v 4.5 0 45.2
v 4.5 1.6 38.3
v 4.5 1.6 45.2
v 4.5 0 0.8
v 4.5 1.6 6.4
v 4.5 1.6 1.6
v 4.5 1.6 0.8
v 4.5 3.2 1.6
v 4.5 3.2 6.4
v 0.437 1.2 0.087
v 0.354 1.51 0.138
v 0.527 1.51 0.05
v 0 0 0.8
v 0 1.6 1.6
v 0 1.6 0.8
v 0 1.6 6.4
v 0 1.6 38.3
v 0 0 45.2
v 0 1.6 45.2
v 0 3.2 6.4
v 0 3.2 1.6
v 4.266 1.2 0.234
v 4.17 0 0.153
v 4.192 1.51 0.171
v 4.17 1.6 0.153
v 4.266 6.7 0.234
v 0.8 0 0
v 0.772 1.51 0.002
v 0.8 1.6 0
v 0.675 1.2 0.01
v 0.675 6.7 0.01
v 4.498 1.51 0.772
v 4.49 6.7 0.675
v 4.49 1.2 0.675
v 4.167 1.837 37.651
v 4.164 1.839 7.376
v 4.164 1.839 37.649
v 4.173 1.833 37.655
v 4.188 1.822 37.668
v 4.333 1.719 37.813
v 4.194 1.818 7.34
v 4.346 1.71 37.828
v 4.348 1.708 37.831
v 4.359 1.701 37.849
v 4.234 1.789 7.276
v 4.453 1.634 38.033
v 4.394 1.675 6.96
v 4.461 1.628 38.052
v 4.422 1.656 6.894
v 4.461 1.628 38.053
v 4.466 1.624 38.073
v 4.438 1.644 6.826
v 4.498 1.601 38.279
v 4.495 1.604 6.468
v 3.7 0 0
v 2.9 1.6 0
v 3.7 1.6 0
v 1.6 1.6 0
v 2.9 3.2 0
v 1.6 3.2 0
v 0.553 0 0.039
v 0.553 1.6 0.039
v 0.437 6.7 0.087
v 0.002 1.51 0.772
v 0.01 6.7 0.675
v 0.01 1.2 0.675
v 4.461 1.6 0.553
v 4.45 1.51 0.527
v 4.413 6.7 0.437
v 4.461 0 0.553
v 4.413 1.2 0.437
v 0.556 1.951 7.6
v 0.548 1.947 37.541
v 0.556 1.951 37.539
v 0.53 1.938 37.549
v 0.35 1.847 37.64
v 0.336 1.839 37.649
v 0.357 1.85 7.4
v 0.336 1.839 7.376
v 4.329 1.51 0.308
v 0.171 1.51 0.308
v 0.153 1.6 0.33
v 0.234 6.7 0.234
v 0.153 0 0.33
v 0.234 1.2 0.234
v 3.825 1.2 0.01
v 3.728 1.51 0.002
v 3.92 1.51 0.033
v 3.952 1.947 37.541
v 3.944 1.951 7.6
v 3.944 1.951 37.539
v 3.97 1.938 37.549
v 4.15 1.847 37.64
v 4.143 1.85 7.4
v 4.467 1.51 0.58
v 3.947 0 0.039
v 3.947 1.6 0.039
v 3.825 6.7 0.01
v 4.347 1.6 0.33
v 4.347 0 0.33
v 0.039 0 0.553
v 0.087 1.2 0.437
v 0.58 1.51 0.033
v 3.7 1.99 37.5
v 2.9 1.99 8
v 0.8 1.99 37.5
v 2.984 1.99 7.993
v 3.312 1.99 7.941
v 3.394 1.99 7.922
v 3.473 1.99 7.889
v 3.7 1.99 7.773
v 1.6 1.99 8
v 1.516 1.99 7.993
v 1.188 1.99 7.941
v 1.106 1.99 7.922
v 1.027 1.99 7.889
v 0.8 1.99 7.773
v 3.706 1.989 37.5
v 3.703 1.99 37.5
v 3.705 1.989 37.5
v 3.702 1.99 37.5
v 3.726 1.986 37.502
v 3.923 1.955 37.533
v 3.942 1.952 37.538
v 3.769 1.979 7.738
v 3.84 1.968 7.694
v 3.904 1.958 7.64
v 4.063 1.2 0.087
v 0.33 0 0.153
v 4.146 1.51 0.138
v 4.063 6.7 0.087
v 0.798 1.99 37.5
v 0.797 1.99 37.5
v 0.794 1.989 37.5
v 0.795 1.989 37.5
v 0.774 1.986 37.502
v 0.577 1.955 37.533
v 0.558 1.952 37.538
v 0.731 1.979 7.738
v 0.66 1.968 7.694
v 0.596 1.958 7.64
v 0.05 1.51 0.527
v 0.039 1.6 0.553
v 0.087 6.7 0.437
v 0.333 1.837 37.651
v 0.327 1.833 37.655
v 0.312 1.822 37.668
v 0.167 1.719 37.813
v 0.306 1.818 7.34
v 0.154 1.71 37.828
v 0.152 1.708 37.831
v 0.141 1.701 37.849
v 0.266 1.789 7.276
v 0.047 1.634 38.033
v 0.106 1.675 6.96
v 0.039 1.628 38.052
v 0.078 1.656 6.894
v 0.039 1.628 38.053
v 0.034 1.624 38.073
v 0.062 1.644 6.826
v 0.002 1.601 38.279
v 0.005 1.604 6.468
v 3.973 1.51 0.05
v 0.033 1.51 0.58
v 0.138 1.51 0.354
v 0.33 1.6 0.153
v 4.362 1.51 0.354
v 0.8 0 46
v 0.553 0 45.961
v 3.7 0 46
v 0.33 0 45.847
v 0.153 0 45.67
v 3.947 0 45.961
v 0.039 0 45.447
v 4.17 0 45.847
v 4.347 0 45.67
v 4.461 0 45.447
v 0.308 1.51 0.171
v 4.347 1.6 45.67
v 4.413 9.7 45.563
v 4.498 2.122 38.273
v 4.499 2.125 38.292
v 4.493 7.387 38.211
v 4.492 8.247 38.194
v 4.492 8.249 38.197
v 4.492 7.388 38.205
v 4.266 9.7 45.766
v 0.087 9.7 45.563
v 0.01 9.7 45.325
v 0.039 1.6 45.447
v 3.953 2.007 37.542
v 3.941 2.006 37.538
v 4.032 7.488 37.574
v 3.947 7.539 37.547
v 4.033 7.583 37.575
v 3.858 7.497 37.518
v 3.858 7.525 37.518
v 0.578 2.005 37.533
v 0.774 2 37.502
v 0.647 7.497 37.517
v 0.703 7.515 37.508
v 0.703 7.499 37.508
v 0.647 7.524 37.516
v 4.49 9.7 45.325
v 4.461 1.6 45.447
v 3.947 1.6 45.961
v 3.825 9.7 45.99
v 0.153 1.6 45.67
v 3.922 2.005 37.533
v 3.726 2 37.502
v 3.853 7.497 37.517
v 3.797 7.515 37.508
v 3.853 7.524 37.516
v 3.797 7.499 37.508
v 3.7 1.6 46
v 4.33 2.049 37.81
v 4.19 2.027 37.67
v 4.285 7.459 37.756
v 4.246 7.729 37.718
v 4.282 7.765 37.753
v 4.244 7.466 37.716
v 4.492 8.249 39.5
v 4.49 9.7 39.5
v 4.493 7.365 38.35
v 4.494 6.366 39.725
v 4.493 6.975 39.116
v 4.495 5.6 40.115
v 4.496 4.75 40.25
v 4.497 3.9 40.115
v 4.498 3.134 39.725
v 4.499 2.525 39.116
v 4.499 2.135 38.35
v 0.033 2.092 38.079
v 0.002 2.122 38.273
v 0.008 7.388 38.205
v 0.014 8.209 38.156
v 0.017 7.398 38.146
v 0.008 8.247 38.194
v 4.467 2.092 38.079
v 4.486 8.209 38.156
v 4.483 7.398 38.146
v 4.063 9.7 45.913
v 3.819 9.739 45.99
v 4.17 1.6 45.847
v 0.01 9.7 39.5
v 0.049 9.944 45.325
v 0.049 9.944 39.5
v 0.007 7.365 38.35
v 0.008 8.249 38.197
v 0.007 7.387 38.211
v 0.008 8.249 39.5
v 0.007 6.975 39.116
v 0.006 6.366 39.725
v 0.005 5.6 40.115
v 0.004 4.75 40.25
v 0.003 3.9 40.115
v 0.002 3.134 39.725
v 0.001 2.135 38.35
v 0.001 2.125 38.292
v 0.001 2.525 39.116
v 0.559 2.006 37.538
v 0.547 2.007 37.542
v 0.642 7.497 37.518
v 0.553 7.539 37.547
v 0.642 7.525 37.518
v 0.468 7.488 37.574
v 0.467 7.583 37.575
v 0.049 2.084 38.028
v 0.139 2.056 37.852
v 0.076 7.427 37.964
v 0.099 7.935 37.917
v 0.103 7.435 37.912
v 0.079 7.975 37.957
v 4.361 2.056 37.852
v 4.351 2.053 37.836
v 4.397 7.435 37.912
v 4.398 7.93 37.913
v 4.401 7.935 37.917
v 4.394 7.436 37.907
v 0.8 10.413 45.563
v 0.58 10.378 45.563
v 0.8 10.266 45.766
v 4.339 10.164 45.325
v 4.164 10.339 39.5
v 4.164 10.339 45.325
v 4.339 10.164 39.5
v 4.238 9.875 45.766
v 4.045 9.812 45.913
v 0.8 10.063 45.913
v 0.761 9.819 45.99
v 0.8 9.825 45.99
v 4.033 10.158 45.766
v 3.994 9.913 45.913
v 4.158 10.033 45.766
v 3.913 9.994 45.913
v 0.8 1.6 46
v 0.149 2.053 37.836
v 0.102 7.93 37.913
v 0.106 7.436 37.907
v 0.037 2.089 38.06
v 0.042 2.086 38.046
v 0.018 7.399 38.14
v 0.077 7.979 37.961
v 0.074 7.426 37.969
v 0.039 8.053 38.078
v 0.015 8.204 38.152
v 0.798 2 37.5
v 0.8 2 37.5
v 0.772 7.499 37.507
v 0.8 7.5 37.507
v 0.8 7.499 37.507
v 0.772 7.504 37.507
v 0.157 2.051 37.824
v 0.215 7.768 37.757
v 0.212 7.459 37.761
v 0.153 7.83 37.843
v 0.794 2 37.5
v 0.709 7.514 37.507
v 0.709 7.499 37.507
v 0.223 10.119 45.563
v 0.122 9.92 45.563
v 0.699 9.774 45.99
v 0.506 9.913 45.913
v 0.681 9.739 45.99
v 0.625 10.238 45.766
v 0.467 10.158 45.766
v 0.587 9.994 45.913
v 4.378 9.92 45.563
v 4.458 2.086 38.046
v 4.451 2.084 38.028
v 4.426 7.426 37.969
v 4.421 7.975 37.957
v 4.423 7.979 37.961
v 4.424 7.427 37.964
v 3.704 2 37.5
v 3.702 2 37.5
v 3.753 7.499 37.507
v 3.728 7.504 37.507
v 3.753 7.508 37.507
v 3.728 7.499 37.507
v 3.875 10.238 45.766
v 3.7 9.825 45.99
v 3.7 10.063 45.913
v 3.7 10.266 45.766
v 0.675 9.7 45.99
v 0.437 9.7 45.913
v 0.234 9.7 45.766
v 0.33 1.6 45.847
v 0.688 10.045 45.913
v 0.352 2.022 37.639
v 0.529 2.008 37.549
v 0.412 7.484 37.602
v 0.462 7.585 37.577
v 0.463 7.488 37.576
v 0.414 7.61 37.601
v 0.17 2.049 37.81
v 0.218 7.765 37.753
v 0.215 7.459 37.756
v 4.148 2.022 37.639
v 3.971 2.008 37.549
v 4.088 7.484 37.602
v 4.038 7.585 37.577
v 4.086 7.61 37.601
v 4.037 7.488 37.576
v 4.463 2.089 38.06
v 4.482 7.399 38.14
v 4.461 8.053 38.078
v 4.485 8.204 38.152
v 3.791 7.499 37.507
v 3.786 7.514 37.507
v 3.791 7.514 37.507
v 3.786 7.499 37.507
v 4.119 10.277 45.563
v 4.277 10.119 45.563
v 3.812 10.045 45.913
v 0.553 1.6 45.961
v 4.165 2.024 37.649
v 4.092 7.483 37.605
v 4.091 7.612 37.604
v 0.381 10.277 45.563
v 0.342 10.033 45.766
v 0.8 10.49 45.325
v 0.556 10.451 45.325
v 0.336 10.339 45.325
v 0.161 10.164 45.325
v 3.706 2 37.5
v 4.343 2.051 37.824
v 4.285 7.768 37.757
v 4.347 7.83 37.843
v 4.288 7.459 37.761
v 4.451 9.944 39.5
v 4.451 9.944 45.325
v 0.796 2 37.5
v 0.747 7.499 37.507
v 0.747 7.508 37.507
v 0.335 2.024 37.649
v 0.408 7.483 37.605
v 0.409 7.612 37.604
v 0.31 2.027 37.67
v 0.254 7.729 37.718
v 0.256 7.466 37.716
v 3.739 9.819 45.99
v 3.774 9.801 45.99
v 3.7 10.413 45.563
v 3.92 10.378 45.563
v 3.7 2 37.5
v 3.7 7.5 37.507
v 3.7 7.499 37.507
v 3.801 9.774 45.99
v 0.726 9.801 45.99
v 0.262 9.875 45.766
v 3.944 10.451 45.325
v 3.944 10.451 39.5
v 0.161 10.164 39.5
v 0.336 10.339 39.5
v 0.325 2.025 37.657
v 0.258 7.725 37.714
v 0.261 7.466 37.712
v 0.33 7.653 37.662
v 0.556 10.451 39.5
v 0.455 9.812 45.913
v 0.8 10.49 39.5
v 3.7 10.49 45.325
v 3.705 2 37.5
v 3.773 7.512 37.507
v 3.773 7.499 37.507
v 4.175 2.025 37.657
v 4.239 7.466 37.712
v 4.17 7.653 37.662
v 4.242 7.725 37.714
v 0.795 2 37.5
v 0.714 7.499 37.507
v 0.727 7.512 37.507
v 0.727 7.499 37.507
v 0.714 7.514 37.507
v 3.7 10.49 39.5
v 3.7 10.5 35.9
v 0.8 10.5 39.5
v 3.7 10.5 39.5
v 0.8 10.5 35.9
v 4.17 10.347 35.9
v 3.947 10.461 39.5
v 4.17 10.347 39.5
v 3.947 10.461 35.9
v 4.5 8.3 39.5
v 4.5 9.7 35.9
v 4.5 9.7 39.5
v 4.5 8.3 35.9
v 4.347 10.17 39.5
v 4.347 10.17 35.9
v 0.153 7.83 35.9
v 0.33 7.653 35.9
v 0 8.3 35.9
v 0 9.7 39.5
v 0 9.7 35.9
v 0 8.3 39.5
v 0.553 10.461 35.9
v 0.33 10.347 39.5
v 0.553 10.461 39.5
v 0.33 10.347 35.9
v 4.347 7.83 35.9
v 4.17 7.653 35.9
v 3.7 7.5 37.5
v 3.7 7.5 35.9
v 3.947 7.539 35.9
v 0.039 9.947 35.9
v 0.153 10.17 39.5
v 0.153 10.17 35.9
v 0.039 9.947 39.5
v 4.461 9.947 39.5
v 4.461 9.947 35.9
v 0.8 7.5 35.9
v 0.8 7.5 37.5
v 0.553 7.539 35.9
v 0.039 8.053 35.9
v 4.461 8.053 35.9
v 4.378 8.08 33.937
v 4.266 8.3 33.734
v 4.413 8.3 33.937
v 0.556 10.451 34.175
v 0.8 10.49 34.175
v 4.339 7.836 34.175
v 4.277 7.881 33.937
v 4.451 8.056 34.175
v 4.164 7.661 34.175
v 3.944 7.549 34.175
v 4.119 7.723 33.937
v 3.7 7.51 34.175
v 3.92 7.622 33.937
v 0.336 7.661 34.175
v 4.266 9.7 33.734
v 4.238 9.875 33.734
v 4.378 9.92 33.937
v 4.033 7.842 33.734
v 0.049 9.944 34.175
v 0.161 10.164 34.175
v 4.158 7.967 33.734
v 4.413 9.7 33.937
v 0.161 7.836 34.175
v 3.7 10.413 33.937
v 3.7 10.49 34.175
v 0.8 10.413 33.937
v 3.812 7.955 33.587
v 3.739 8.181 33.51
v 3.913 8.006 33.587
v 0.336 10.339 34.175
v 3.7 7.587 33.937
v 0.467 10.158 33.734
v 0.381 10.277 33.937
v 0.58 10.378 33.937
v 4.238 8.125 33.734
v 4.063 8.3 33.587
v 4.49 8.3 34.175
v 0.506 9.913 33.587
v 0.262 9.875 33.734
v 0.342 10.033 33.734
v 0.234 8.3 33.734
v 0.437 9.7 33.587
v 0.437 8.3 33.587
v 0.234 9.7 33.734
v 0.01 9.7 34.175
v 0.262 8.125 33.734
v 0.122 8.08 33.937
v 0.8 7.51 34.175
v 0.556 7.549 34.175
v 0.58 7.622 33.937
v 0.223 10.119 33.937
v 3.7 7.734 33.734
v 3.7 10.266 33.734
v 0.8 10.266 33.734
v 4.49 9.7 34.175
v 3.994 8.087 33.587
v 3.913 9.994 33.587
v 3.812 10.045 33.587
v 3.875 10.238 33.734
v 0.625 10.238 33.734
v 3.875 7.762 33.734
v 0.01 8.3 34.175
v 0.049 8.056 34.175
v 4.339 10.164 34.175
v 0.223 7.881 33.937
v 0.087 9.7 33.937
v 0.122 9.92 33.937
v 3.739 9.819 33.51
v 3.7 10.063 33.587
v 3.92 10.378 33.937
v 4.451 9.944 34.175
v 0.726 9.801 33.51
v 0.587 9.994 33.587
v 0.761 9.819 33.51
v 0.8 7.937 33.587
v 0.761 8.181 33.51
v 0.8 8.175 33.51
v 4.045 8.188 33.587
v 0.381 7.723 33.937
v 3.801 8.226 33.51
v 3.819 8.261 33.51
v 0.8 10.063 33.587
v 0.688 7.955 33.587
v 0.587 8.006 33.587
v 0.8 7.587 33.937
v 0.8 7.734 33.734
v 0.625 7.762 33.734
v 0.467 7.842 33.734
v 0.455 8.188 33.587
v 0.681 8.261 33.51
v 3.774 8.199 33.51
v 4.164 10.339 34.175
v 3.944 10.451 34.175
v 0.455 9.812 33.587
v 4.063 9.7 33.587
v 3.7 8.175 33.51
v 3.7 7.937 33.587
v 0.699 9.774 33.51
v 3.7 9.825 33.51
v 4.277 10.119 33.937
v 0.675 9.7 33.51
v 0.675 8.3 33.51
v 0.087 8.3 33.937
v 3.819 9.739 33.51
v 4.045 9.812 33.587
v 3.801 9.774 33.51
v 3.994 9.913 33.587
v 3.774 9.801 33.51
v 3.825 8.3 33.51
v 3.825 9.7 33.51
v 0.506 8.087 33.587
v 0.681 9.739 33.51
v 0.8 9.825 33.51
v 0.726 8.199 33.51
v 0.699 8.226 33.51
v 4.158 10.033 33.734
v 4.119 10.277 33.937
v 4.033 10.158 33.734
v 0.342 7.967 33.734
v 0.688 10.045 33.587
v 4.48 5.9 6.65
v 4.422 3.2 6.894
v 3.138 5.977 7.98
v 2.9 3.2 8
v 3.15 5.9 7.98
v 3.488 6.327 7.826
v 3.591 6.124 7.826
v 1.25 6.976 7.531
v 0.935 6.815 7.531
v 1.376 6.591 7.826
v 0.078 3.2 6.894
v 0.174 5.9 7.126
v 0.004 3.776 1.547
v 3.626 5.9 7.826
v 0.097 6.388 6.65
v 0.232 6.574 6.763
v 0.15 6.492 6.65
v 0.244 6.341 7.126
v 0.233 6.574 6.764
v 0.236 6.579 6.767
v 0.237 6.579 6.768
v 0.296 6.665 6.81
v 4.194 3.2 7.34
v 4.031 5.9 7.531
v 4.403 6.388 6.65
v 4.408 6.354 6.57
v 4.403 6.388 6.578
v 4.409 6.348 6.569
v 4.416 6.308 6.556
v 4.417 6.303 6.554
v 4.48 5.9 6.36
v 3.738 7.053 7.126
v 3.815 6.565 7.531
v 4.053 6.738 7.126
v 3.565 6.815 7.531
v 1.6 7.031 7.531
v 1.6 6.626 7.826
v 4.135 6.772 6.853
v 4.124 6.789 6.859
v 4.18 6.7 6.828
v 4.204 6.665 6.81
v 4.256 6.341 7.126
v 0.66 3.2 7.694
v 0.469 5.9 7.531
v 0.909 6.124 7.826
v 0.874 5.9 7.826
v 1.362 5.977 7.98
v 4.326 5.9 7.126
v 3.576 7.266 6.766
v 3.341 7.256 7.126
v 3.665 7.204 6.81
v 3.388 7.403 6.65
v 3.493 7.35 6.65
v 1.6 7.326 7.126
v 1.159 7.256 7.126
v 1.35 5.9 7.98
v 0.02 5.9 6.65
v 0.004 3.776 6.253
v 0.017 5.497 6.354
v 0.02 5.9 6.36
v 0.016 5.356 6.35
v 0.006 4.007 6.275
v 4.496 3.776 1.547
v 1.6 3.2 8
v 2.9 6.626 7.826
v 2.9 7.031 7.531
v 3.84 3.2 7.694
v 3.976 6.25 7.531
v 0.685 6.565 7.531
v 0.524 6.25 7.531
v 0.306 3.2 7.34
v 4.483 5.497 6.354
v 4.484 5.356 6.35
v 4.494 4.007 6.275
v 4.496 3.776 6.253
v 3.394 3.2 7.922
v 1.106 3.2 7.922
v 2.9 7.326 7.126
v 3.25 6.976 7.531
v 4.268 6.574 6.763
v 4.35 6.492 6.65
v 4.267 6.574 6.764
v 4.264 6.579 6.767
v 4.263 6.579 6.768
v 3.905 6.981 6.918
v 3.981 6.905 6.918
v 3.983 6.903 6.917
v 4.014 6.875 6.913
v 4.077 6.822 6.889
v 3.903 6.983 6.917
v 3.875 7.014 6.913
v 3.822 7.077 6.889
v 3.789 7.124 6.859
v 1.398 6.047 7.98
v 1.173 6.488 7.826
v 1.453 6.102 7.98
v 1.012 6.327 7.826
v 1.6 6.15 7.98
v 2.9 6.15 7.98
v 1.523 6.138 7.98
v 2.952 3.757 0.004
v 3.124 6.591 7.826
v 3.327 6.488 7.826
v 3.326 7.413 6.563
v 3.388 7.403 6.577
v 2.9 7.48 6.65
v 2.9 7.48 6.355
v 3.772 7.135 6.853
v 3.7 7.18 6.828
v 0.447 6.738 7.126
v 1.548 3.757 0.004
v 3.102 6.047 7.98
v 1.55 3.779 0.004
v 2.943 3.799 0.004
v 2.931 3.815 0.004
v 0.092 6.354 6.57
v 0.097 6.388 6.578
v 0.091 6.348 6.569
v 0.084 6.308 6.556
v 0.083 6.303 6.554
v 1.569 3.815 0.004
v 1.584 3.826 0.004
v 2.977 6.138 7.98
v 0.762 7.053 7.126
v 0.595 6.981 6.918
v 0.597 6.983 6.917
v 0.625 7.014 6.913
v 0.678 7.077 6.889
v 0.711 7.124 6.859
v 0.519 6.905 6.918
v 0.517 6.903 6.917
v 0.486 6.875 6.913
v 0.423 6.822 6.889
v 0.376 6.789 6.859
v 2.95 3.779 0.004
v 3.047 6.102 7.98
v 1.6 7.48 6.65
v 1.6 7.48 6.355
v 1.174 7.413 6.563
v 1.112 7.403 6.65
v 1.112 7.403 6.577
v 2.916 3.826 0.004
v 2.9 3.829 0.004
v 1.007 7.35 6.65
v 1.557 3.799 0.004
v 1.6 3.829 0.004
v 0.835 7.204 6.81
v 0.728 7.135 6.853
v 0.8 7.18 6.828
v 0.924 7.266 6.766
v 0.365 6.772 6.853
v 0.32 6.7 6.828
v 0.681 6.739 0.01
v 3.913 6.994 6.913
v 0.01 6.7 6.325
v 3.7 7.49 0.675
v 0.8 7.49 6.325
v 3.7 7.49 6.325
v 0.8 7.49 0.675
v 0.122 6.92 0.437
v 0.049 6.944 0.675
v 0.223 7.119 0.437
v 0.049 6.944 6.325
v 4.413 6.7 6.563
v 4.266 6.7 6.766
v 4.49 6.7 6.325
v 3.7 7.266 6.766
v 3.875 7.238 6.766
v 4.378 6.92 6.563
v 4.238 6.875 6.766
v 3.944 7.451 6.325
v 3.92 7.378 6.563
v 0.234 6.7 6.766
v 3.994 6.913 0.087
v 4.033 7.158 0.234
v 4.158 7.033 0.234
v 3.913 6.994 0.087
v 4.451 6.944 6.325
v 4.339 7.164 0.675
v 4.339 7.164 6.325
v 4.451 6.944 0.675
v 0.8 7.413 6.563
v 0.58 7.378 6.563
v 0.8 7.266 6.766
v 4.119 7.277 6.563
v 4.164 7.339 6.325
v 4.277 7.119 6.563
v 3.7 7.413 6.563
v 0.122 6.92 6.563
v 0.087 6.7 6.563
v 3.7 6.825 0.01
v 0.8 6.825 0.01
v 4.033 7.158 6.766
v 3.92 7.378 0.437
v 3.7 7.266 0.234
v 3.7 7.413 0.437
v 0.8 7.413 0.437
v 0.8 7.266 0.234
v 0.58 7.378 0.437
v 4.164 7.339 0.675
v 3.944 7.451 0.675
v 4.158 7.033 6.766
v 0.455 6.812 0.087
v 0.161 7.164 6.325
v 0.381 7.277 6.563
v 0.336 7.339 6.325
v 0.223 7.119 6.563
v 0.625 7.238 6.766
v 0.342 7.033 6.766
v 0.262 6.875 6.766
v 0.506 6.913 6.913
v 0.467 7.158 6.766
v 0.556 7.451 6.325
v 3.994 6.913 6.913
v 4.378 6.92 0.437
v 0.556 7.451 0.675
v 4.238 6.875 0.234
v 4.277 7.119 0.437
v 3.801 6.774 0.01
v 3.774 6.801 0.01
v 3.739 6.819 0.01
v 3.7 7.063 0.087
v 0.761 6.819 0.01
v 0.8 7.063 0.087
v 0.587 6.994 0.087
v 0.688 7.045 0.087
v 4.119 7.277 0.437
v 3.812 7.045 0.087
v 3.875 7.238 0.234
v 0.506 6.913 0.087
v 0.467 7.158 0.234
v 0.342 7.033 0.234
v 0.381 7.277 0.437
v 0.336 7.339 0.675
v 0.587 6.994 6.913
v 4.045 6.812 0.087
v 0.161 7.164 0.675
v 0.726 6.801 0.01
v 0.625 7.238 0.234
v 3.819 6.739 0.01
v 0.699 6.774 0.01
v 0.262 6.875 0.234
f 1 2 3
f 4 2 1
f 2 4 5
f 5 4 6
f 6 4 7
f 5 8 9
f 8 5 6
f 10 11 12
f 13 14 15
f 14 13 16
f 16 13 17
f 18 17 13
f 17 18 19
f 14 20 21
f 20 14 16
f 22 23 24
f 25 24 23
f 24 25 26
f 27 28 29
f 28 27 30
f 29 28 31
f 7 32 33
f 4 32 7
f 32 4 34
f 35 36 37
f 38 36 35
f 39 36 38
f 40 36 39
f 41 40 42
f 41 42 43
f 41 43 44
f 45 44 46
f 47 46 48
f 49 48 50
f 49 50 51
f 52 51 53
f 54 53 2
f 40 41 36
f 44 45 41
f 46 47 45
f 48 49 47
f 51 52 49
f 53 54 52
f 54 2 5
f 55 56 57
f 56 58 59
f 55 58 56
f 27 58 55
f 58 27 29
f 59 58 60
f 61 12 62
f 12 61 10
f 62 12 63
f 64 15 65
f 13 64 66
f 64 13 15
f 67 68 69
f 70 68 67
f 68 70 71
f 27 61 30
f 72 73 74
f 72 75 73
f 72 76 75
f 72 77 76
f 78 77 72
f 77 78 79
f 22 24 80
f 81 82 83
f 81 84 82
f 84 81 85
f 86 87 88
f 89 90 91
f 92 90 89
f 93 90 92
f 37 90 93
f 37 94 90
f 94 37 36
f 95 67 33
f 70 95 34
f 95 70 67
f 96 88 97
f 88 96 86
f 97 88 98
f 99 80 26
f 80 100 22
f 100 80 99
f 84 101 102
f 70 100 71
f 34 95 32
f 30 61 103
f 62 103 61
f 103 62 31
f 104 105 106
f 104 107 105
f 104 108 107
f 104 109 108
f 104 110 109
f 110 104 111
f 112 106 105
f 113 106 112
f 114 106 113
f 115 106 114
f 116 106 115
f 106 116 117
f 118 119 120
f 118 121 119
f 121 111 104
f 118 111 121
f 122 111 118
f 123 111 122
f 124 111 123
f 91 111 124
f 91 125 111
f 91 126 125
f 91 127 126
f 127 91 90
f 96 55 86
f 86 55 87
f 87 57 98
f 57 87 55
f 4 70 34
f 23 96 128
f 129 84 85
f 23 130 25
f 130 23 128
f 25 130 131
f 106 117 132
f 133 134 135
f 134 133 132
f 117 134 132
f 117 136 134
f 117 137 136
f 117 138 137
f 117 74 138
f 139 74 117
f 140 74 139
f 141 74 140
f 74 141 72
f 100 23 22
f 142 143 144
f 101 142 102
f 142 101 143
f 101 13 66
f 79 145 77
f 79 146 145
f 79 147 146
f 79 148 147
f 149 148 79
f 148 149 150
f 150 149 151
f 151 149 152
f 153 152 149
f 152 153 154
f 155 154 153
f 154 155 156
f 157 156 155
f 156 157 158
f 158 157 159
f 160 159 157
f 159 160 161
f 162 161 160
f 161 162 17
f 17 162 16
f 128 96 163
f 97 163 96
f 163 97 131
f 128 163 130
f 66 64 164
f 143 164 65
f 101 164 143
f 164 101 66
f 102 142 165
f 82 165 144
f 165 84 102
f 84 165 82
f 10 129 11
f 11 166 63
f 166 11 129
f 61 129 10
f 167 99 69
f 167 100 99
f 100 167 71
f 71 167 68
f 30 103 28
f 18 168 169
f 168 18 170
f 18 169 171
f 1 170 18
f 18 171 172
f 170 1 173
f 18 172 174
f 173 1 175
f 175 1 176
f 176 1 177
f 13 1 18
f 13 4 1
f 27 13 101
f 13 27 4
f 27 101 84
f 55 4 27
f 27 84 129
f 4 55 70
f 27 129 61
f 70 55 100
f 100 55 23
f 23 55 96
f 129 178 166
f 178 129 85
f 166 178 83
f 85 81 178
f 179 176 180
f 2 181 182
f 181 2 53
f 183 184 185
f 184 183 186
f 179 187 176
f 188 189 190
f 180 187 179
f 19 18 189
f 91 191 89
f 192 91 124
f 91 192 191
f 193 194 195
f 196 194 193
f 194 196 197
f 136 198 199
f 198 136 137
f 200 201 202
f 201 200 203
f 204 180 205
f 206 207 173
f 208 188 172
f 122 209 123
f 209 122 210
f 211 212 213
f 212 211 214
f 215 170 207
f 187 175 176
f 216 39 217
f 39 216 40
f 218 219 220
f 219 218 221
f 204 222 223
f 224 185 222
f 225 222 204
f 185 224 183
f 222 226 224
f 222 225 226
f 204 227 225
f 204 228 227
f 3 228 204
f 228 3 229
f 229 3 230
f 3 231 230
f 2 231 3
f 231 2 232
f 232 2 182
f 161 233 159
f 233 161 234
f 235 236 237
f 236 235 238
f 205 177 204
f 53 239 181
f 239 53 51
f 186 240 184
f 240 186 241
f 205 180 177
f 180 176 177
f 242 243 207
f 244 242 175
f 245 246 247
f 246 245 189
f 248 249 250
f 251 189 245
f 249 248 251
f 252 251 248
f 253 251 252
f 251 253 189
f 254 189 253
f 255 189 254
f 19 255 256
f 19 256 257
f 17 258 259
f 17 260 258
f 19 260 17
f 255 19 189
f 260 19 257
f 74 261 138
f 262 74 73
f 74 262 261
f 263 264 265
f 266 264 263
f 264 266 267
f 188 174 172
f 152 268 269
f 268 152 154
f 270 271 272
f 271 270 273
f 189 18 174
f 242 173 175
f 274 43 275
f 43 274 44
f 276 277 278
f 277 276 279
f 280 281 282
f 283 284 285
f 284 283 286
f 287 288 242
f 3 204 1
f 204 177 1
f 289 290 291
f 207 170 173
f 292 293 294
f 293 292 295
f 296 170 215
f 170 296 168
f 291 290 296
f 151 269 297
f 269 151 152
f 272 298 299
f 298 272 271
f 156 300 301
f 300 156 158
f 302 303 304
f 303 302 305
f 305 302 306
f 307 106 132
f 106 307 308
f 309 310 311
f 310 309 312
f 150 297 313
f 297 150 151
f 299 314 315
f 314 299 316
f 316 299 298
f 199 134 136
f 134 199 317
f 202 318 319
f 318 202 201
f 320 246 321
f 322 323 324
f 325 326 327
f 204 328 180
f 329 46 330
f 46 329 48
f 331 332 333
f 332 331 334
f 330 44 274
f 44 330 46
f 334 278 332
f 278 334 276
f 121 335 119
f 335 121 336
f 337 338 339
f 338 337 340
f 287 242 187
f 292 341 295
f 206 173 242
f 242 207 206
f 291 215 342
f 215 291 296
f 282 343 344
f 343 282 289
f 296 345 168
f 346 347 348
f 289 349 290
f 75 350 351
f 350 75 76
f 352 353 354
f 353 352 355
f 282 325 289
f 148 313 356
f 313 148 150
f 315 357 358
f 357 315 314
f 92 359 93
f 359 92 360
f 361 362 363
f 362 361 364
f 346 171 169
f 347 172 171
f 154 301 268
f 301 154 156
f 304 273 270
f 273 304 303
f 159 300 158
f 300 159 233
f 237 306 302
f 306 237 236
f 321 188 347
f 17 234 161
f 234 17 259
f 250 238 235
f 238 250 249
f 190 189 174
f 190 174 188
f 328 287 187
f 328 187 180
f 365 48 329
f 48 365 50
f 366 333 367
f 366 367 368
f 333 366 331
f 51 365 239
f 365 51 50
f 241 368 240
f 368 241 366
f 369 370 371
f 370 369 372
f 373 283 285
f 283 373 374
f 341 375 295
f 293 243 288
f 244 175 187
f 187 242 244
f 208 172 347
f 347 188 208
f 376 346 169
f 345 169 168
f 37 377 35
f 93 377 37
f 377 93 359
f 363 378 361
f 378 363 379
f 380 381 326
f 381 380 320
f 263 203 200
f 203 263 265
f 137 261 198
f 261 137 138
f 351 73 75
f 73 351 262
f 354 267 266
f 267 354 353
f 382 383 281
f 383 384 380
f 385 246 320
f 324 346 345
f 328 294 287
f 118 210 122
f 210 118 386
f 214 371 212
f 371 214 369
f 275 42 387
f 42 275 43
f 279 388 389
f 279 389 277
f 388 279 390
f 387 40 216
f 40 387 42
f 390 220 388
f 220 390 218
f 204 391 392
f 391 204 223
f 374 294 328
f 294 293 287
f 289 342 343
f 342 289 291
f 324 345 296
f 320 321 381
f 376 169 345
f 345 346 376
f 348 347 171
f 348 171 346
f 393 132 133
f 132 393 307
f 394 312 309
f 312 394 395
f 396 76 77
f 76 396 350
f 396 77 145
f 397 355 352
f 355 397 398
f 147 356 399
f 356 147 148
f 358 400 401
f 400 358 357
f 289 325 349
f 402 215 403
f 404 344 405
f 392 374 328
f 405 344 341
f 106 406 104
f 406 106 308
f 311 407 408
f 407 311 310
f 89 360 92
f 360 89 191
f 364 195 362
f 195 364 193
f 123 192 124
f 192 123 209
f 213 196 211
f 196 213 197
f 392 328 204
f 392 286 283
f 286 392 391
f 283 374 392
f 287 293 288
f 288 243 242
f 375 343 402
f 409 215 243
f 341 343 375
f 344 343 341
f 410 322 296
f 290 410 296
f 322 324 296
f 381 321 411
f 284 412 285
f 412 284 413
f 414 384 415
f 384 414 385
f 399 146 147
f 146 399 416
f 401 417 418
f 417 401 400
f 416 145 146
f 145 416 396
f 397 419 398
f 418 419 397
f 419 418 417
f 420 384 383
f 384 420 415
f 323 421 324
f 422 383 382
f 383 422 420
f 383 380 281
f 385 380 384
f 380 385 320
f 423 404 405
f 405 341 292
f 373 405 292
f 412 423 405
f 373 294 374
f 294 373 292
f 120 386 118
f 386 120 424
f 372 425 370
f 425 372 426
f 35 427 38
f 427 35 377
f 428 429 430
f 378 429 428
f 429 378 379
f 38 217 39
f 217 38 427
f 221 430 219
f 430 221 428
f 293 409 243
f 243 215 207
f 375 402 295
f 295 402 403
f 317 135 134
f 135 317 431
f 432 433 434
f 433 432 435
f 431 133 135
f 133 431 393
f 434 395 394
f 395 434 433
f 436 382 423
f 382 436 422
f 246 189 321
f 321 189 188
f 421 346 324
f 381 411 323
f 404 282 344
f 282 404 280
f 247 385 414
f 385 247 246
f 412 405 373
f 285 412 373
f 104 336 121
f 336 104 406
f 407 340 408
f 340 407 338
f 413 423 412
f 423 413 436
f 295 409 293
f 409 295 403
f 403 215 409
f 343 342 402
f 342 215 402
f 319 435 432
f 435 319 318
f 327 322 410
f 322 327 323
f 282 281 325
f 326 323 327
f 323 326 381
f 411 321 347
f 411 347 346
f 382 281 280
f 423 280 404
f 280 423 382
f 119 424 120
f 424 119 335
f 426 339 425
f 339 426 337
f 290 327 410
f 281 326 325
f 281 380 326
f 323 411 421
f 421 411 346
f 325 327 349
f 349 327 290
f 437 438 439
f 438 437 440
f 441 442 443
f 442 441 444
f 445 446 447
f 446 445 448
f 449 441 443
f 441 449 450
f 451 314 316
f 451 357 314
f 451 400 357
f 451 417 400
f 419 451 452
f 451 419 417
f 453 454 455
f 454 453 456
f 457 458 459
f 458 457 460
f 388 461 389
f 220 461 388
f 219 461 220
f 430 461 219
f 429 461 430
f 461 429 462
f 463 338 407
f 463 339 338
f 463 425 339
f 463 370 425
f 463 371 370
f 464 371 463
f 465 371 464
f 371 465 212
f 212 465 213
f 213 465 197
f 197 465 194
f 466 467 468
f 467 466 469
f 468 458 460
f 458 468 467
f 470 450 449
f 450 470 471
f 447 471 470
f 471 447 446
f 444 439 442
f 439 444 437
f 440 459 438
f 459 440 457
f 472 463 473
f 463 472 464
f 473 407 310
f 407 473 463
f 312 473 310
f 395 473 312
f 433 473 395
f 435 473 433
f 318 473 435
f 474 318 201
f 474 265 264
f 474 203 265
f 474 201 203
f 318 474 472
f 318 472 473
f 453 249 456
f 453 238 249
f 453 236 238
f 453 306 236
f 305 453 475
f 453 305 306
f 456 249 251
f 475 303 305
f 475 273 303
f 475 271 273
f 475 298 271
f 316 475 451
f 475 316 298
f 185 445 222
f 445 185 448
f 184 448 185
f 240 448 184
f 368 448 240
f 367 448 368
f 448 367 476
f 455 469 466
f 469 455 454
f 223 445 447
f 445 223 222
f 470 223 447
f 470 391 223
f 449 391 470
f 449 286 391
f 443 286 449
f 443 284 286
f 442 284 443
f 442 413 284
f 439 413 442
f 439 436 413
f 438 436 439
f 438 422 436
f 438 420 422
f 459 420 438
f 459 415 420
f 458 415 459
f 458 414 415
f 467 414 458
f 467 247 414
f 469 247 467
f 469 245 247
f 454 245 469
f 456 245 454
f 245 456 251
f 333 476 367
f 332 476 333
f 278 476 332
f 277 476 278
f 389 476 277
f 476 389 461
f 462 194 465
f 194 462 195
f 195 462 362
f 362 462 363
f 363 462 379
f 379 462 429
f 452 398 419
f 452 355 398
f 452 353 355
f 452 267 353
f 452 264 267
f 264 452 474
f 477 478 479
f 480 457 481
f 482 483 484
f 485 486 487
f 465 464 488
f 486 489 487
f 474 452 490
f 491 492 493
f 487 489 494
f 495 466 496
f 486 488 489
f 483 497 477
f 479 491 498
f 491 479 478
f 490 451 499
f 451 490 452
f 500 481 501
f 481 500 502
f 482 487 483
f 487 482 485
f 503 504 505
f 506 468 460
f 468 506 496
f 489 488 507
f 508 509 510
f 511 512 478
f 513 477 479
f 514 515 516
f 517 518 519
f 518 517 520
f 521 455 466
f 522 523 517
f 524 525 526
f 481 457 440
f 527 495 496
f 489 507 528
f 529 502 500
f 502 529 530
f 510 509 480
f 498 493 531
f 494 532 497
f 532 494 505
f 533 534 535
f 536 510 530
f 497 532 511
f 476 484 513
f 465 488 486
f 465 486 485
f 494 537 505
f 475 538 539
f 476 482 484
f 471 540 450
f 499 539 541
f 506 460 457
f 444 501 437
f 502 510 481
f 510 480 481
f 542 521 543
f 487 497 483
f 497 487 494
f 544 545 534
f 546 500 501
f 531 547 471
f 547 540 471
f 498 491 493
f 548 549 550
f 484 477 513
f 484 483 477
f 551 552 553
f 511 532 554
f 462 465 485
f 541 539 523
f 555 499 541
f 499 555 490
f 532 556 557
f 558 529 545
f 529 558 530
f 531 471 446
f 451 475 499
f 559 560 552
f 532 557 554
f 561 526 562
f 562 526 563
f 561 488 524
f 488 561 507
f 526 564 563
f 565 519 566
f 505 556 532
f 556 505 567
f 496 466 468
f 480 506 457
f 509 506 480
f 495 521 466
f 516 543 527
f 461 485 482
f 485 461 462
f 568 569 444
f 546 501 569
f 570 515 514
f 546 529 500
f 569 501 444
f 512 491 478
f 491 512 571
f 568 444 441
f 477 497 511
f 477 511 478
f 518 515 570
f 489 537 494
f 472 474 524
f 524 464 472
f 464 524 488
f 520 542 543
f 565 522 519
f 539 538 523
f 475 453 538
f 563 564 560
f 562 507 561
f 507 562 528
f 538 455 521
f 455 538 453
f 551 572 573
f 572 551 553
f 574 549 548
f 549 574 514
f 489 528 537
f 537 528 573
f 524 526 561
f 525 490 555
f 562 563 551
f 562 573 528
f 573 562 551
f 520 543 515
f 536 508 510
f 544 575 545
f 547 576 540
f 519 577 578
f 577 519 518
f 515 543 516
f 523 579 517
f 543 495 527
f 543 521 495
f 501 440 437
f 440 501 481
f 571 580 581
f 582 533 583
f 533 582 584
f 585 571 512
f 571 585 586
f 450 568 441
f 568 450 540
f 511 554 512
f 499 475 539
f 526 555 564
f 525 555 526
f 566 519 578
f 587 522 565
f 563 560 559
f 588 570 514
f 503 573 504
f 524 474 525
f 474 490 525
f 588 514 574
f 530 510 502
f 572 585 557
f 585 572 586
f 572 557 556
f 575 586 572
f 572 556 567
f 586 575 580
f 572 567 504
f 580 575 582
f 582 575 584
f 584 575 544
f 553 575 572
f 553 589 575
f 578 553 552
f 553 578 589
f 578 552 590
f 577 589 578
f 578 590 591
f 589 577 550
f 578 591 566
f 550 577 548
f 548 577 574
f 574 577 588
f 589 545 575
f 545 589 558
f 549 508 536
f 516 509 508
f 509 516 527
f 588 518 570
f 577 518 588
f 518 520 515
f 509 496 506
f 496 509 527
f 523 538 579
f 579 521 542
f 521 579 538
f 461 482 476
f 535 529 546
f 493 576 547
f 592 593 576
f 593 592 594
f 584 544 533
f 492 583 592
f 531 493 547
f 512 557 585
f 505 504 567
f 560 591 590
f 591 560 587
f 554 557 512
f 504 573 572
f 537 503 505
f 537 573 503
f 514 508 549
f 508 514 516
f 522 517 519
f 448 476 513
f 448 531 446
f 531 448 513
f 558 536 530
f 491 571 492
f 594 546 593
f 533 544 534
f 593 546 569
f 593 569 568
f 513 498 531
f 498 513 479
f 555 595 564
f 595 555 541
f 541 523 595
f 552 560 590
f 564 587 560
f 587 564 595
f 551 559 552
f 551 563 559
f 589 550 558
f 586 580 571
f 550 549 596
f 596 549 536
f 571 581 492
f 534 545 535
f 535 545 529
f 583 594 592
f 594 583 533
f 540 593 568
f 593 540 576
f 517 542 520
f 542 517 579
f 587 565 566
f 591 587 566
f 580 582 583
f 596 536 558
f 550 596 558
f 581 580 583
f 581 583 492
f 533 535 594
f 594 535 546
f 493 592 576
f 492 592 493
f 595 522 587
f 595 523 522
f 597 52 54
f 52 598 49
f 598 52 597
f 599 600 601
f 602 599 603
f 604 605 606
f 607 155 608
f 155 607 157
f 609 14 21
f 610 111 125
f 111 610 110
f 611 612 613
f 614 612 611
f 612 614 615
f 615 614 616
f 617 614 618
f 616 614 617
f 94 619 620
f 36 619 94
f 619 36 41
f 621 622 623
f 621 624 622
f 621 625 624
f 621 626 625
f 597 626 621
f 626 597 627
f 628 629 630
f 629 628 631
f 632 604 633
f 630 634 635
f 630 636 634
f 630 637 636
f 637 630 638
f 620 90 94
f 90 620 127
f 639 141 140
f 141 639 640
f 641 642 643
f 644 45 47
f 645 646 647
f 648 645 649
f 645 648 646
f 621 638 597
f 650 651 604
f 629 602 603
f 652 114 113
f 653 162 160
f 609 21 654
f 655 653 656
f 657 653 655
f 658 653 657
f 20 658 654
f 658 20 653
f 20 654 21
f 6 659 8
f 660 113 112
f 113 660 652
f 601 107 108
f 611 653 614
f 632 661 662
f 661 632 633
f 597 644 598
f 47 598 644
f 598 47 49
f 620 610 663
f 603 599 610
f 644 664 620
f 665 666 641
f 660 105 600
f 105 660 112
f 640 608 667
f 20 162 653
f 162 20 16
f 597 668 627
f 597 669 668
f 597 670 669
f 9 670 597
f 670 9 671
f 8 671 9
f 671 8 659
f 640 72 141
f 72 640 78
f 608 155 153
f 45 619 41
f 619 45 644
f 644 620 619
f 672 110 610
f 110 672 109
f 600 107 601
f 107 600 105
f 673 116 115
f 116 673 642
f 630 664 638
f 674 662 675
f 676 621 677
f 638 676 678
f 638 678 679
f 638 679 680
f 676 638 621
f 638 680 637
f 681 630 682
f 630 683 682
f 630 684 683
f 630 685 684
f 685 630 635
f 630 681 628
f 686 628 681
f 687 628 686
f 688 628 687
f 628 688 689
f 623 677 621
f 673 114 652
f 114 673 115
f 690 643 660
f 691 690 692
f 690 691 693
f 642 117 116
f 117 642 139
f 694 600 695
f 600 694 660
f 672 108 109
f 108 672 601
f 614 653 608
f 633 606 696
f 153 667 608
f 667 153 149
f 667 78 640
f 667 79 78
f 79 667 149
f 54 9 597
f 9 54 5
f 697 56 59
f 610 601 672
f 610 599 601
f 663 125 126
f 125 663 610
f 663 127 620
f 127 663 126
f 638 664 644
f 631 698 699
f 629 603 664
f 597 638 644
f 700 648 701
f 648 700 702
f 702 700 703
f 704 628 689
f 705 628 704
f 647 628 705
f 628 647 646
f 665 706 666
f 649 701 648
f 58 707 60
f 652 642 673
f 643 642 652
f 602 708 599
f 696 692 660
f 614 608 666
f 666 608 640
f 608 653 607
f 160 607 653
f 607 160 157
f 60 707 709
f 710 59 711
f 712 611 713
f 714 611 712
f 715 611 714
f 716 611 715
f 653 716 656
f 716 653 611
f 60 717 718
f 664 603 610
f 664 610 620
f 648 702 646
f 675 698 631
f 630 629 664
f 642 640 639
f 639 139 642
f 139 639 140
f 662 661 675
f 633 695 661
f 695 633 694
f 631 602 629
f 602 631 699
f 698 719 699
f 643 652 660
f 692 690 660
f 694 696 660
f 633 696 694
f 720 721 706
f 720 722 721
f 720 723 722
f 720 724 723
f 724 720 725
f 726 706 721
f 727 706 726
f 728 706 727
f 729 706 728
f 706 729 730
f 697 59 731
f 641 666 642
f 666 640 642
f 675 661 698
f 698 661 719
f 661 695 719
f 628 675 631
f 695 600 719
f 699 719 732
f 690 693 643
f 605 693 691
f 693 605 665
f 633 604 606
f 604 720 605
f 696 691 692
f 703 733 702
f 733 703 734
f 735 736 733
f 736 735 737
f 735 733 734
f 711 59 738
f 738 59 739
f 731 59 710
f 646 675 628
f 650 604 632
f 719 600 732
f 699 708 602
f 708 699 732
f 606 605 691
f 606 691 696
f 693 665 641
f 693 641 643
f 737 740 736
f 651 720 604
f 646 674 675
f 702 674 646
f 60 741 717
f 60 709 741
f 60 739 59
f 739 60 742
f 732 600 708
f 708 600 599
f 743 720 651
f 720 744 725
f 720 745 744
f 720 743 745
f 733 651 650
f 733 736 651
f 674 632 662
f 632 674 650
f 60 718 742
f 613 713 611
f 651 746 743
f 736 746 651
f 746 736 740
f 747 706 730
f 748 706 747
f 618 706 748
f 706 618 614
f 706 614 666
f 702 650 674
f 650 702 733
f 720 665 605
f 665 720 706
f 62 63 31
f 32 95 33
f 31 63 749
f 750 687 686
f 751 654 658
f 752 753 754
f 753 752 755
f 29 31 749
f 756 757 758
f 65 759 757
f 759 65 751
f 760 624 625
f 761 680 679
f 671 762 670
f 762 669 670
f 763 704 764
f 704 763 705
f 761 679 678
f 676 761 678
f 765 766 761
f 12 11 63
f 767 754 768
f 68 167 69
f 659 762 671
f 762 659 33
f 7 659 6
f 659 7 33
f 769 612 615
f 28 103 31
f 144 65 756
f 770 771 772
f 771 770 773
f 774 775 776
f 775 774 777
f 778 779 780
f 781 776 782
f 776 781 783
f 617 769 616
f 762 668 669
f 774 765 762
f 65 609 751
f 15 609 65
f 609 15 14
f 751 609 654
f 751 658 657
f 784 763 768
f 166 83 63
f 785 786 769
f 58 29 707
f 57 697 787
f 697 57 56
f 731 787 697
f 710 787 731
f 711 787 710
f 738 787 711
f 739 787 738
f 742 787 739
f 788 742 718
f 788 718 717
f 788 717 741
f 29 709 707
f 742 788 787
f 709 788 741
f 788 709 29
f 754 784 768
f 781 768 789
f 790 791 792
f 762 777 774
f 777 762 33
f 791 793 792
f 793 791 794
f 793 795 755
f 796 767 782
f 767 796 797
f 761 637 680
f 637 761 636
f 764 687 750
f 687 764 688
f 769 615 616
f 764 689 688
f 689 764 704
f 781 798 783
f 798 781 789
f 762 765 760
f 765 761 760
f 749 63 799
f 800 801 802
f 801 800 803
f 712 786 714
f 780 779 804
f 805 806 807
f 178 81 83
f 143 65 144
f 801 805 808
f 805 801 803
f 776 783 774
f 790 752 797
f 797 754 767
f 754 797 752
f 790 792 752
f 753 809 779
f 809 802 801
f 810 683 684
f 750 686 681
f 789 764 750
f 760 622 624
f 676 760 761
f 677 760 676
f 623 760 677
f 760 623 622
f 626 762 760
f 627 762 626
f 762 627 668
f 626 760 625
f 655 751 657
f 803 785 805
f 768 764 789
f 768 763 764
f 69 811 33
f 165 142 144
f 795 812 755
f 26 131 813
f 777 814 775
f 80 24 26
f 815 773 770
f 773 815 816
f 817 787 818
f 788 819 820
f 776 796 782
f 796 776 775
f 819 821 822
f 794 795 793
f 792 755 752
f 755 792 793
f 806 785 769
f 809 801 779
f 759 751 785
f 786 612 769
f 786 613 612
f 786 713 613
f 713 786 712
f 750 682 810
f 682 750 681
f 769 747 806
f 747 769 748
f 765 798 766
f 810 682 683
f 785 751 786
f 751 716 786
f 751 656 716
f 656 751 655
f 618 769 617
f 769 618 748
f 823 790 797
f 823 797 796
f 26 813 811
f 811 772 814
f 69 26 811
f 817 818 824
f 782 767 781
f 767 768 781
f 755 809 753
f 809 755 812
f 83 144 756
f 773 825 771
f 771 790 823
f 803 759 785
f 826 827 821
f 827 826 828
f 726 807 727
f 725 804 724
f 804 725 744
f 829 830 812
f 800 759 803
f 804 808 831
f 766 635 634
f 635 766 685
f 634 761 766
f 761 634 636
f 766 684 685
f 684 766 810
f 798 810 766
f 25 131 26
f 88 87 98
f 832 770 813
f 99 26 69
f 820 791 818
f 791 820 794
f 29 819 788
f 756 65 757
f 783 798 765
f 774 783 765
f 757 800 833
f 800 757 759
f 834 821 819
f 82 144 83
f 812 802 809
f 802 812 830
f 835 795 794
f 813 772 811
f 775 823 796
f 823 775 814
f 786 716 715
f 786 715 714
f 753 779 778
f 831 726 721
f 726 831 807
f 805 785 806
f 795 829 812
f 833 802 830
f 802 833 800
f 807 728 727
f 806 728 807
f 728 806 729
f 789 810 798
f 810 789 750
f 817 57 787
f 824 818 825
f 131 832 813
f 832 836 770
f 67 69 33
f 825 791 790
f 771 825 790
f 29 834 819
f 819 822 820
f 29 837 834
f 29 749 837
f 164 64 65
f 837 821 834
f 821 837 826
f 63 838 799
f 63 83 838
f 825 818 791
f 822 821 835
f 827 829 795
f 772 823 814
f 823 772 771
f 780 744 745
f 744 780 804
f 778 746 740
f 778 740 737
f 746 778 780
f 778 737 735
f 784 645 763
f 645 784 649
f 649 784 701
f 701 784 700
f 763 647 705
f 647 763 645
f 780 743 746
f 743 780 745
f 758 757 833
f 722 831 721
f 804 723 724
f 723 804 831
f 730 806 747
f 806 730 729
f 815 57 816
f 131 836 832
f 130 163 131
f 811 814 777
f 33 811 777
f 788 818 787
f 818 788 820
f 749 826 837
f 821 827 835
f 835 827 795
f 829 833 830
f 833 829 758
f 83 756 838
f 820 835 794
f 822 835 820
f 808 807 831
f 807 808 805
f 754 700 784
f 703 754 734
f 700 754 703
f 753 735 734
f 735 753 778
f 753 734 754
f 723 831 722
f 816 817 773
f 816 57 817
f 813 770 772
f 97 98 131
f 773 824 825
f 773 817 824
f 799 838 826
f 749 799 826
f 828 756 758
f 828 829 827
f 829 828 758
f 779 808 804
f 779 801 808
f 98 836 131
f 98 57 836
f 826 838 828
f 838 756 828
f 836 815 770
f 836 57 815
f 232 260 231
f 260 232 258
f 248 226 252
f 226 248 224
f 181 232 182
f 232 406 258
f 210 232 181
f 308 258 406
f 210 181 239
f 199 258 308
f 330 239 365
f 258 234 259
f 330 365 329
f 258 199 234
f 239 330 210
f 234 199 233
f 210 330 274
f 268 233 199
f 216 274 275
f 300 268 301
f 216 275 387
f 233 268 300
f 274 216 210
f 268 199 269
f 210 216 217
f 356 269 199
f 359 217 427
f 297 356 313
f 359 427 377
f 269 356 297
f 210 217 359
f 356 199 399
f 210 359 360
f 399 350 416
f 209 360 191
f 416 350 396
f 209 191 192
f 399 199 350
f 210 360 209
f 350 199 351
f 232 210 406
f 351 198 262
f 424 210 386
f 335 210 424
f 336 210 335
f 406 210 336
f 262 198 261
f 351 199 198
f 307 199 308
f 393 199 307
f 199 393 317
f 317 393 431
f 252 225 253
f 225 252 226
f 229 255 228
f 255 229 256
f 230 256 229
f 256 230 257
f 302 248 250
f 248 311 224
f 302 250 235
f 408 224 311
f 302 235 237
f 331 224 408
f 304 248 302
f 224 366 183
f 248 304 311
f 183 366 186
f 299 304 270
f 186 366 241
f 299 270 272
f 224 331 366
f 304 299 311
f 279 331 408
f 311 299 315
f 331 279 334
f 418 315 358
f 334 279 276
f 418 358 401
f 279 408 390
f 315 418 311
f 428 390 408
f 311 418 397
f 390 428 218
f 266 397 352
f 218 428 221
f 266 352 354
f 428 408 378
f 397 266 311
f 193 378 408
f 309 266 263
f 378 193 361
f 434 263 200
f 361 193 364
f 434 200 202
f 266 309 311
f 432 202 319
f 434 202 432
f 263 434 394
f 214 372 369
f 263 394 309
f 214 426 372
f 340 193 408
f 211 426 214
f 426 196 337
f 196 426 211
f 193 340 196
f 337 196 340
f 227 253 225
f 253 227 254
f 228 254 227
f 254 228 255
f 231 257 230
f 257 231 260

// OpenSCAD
// file: ../../../../modules/scad/roundedcube.scad
// More information: https://danielupshaw.com/openscad-rounded-corners/


// Examples
// color("Yellow")
// roundedcube(3, true, 0.7, "xmin");

// translate(v = [1, 0, 2])
// color("Pink")
// roundedcube([4, 2, 2], false, 0.6, "zmax");

// translate(v = [-4, -1, 2])
// color("Lightblue")
// roundedcube(2, false);

// translate(v = [0, 0, 6])
// color("Orange")
// roundedcube([3, 2, 2], true, 0.2);

// translate(v = [2.5, -0.5, 5])
// color("Green")
// roundedcube([3, 2, 2], false, 0.4, "z");

// Set to 0.01 for higher definition curves (renders slower)
$fs = 0.15;

module roundedcube(size = [1, 1, 1], center = false, radius = 0.5, apply_to = "all") {
	// If single value, convert to [x, y, z] vector
	size = (size[0] == undef) ? [size, size, size] : size;

	translate_min = radius;
	translate_xmax = size[0] - radius;
	translate_ymax = size[1] - radius;
	translate_zmax = size[2] - radius;

	diameter = radius * 2;

	obj_translate = (center == false) ?
		[0, 0, 0] : [
			-(size[0] / 2),
			-(size[1] / 2),
			-(size[2] / 2)
		];

	translate(v = obj_translate) {
		hull() {
			for (translate_x = [translate_min, translate_xmax]) {
				x_at = (translate_x == translate_min) ? "min" : "max";
				for (translate_y = [translate_min, translate_ymax]) {
					y_at = (translate_y == translate_min) ? "min" : "max";
					for (translate_z = [translate_min, translate_zmax]) {
						z_at = (translate_z == translate_min) ? "min" : "max";

						translate(v = [translate_x, translate_y, translate_z])
						if (
							(apply_to == "all") ||
							(apply_to == "xmin" && x_at == "min") || (apply_to == "xmax" && x_at == "max") ||
							(apply_to == "ymin" && y_at == "min") || (apply_to == "ymax" && y_at == "max") ||
							(apply_to == "zmin" && z_at == "min") || (apply_to == "zmax" && z_at == "max")
						) {
							sphere(r = radius);
						} else {
							rotate = 
								(apply_to == "xmin" || apply_to == "xmax" || apply_to == "x") ? [0, 90, 0] : (
								(apply_to == "ymin" || apply_to == "ymax" || apply_to == "y") ? [90, 90, 0] :
								[0, 0, 0]
							);
							rotate(a = rotate)
							cylinder(h = diameter, r = radius, center = true);
						}
					}
				}
			}
		}
	}
}
// main file
$fn=20;

sh_height=43;
sh_width=4.5;
sh_hanger_spacing=5.5;
sh_material_size=2;
sh_short_tail=4;
sh_corner_radius = 0.8;

use <../../../../modules/scad/roundedcube.scad>

module ikea_skadis_holder() {
    difference() {
        union() {
            
            //Vertical wall
            color("green")
            roundedcube(size = [sh_width,sh_material_size,sh_height], center = false, radius = sh_corner_radius, apply_to = "ymax");
            //cube([sh_width,sh_material_size,sh_height]);
            
            // Retainer
            color("blue")
            translate([0,0,sh_height-sh_hanger_spacing])
            roundedcube(size = [sh_width, sh_hanger_spacing + sh_material_size * 2 + 1, sh_hanger_spacing + 3], center = false, radius = sh_corner_radius, apply_to = "ymax");

            //Vertical wall connection (short)
            color("cyan")
            translate([0, sh_hanger_spacing + sh_material_size , sh_height - sh_hanger_spacing])
            roundedcube(size = [sh_width, sh_material_size + 1, 2], center = false, radius = sh_corner_radius, apply_to = "z");

            //Vertical wall (short)
            color("cyan")
            translate([0, sh_hanger_spacing + sh_material_size , sh_height - sh_short_tail - sh_hanger_spacing])
            //cube([sh_width,sh_material_size+1,sh_short_tail]);
            roundedcube(size = [sh_width, sh_material_size + 1, sh_short_tail], center = false, radius = sh_corner_radius, apply_to = "zmin");

            //Schnöpsel
            color("yellow")
            translate([0, sh_material_size - 2, 0])
            roundedcube(size = [sh_width, sh_hanger_spacing + 2, 8], center = false, radius = sh_corner_radius + 0.8, apply_to = "ymax");

            //Schnöpsel - Angleichen des unteren radius
            color("yellow")
            translate([0, sh_material_size - 2, 0])
            roundedcube(size = [sh_width, sh_hanger_spacing + 2, 7], center = false, radius = sh_corner_radius, apply_to = "ymax");

        }
        
        
    color("red")
    translate([-1,sh_material_size+sh_hanger_spacing/2,sh_height-sh_hanger_spacing])
    rotate([0,90,0])
    cylinder(sh_width+2, sh_hanger_spacing/2, sh_hanger_spacing/2);
        
    }
}

ikea_skadis_holder();
